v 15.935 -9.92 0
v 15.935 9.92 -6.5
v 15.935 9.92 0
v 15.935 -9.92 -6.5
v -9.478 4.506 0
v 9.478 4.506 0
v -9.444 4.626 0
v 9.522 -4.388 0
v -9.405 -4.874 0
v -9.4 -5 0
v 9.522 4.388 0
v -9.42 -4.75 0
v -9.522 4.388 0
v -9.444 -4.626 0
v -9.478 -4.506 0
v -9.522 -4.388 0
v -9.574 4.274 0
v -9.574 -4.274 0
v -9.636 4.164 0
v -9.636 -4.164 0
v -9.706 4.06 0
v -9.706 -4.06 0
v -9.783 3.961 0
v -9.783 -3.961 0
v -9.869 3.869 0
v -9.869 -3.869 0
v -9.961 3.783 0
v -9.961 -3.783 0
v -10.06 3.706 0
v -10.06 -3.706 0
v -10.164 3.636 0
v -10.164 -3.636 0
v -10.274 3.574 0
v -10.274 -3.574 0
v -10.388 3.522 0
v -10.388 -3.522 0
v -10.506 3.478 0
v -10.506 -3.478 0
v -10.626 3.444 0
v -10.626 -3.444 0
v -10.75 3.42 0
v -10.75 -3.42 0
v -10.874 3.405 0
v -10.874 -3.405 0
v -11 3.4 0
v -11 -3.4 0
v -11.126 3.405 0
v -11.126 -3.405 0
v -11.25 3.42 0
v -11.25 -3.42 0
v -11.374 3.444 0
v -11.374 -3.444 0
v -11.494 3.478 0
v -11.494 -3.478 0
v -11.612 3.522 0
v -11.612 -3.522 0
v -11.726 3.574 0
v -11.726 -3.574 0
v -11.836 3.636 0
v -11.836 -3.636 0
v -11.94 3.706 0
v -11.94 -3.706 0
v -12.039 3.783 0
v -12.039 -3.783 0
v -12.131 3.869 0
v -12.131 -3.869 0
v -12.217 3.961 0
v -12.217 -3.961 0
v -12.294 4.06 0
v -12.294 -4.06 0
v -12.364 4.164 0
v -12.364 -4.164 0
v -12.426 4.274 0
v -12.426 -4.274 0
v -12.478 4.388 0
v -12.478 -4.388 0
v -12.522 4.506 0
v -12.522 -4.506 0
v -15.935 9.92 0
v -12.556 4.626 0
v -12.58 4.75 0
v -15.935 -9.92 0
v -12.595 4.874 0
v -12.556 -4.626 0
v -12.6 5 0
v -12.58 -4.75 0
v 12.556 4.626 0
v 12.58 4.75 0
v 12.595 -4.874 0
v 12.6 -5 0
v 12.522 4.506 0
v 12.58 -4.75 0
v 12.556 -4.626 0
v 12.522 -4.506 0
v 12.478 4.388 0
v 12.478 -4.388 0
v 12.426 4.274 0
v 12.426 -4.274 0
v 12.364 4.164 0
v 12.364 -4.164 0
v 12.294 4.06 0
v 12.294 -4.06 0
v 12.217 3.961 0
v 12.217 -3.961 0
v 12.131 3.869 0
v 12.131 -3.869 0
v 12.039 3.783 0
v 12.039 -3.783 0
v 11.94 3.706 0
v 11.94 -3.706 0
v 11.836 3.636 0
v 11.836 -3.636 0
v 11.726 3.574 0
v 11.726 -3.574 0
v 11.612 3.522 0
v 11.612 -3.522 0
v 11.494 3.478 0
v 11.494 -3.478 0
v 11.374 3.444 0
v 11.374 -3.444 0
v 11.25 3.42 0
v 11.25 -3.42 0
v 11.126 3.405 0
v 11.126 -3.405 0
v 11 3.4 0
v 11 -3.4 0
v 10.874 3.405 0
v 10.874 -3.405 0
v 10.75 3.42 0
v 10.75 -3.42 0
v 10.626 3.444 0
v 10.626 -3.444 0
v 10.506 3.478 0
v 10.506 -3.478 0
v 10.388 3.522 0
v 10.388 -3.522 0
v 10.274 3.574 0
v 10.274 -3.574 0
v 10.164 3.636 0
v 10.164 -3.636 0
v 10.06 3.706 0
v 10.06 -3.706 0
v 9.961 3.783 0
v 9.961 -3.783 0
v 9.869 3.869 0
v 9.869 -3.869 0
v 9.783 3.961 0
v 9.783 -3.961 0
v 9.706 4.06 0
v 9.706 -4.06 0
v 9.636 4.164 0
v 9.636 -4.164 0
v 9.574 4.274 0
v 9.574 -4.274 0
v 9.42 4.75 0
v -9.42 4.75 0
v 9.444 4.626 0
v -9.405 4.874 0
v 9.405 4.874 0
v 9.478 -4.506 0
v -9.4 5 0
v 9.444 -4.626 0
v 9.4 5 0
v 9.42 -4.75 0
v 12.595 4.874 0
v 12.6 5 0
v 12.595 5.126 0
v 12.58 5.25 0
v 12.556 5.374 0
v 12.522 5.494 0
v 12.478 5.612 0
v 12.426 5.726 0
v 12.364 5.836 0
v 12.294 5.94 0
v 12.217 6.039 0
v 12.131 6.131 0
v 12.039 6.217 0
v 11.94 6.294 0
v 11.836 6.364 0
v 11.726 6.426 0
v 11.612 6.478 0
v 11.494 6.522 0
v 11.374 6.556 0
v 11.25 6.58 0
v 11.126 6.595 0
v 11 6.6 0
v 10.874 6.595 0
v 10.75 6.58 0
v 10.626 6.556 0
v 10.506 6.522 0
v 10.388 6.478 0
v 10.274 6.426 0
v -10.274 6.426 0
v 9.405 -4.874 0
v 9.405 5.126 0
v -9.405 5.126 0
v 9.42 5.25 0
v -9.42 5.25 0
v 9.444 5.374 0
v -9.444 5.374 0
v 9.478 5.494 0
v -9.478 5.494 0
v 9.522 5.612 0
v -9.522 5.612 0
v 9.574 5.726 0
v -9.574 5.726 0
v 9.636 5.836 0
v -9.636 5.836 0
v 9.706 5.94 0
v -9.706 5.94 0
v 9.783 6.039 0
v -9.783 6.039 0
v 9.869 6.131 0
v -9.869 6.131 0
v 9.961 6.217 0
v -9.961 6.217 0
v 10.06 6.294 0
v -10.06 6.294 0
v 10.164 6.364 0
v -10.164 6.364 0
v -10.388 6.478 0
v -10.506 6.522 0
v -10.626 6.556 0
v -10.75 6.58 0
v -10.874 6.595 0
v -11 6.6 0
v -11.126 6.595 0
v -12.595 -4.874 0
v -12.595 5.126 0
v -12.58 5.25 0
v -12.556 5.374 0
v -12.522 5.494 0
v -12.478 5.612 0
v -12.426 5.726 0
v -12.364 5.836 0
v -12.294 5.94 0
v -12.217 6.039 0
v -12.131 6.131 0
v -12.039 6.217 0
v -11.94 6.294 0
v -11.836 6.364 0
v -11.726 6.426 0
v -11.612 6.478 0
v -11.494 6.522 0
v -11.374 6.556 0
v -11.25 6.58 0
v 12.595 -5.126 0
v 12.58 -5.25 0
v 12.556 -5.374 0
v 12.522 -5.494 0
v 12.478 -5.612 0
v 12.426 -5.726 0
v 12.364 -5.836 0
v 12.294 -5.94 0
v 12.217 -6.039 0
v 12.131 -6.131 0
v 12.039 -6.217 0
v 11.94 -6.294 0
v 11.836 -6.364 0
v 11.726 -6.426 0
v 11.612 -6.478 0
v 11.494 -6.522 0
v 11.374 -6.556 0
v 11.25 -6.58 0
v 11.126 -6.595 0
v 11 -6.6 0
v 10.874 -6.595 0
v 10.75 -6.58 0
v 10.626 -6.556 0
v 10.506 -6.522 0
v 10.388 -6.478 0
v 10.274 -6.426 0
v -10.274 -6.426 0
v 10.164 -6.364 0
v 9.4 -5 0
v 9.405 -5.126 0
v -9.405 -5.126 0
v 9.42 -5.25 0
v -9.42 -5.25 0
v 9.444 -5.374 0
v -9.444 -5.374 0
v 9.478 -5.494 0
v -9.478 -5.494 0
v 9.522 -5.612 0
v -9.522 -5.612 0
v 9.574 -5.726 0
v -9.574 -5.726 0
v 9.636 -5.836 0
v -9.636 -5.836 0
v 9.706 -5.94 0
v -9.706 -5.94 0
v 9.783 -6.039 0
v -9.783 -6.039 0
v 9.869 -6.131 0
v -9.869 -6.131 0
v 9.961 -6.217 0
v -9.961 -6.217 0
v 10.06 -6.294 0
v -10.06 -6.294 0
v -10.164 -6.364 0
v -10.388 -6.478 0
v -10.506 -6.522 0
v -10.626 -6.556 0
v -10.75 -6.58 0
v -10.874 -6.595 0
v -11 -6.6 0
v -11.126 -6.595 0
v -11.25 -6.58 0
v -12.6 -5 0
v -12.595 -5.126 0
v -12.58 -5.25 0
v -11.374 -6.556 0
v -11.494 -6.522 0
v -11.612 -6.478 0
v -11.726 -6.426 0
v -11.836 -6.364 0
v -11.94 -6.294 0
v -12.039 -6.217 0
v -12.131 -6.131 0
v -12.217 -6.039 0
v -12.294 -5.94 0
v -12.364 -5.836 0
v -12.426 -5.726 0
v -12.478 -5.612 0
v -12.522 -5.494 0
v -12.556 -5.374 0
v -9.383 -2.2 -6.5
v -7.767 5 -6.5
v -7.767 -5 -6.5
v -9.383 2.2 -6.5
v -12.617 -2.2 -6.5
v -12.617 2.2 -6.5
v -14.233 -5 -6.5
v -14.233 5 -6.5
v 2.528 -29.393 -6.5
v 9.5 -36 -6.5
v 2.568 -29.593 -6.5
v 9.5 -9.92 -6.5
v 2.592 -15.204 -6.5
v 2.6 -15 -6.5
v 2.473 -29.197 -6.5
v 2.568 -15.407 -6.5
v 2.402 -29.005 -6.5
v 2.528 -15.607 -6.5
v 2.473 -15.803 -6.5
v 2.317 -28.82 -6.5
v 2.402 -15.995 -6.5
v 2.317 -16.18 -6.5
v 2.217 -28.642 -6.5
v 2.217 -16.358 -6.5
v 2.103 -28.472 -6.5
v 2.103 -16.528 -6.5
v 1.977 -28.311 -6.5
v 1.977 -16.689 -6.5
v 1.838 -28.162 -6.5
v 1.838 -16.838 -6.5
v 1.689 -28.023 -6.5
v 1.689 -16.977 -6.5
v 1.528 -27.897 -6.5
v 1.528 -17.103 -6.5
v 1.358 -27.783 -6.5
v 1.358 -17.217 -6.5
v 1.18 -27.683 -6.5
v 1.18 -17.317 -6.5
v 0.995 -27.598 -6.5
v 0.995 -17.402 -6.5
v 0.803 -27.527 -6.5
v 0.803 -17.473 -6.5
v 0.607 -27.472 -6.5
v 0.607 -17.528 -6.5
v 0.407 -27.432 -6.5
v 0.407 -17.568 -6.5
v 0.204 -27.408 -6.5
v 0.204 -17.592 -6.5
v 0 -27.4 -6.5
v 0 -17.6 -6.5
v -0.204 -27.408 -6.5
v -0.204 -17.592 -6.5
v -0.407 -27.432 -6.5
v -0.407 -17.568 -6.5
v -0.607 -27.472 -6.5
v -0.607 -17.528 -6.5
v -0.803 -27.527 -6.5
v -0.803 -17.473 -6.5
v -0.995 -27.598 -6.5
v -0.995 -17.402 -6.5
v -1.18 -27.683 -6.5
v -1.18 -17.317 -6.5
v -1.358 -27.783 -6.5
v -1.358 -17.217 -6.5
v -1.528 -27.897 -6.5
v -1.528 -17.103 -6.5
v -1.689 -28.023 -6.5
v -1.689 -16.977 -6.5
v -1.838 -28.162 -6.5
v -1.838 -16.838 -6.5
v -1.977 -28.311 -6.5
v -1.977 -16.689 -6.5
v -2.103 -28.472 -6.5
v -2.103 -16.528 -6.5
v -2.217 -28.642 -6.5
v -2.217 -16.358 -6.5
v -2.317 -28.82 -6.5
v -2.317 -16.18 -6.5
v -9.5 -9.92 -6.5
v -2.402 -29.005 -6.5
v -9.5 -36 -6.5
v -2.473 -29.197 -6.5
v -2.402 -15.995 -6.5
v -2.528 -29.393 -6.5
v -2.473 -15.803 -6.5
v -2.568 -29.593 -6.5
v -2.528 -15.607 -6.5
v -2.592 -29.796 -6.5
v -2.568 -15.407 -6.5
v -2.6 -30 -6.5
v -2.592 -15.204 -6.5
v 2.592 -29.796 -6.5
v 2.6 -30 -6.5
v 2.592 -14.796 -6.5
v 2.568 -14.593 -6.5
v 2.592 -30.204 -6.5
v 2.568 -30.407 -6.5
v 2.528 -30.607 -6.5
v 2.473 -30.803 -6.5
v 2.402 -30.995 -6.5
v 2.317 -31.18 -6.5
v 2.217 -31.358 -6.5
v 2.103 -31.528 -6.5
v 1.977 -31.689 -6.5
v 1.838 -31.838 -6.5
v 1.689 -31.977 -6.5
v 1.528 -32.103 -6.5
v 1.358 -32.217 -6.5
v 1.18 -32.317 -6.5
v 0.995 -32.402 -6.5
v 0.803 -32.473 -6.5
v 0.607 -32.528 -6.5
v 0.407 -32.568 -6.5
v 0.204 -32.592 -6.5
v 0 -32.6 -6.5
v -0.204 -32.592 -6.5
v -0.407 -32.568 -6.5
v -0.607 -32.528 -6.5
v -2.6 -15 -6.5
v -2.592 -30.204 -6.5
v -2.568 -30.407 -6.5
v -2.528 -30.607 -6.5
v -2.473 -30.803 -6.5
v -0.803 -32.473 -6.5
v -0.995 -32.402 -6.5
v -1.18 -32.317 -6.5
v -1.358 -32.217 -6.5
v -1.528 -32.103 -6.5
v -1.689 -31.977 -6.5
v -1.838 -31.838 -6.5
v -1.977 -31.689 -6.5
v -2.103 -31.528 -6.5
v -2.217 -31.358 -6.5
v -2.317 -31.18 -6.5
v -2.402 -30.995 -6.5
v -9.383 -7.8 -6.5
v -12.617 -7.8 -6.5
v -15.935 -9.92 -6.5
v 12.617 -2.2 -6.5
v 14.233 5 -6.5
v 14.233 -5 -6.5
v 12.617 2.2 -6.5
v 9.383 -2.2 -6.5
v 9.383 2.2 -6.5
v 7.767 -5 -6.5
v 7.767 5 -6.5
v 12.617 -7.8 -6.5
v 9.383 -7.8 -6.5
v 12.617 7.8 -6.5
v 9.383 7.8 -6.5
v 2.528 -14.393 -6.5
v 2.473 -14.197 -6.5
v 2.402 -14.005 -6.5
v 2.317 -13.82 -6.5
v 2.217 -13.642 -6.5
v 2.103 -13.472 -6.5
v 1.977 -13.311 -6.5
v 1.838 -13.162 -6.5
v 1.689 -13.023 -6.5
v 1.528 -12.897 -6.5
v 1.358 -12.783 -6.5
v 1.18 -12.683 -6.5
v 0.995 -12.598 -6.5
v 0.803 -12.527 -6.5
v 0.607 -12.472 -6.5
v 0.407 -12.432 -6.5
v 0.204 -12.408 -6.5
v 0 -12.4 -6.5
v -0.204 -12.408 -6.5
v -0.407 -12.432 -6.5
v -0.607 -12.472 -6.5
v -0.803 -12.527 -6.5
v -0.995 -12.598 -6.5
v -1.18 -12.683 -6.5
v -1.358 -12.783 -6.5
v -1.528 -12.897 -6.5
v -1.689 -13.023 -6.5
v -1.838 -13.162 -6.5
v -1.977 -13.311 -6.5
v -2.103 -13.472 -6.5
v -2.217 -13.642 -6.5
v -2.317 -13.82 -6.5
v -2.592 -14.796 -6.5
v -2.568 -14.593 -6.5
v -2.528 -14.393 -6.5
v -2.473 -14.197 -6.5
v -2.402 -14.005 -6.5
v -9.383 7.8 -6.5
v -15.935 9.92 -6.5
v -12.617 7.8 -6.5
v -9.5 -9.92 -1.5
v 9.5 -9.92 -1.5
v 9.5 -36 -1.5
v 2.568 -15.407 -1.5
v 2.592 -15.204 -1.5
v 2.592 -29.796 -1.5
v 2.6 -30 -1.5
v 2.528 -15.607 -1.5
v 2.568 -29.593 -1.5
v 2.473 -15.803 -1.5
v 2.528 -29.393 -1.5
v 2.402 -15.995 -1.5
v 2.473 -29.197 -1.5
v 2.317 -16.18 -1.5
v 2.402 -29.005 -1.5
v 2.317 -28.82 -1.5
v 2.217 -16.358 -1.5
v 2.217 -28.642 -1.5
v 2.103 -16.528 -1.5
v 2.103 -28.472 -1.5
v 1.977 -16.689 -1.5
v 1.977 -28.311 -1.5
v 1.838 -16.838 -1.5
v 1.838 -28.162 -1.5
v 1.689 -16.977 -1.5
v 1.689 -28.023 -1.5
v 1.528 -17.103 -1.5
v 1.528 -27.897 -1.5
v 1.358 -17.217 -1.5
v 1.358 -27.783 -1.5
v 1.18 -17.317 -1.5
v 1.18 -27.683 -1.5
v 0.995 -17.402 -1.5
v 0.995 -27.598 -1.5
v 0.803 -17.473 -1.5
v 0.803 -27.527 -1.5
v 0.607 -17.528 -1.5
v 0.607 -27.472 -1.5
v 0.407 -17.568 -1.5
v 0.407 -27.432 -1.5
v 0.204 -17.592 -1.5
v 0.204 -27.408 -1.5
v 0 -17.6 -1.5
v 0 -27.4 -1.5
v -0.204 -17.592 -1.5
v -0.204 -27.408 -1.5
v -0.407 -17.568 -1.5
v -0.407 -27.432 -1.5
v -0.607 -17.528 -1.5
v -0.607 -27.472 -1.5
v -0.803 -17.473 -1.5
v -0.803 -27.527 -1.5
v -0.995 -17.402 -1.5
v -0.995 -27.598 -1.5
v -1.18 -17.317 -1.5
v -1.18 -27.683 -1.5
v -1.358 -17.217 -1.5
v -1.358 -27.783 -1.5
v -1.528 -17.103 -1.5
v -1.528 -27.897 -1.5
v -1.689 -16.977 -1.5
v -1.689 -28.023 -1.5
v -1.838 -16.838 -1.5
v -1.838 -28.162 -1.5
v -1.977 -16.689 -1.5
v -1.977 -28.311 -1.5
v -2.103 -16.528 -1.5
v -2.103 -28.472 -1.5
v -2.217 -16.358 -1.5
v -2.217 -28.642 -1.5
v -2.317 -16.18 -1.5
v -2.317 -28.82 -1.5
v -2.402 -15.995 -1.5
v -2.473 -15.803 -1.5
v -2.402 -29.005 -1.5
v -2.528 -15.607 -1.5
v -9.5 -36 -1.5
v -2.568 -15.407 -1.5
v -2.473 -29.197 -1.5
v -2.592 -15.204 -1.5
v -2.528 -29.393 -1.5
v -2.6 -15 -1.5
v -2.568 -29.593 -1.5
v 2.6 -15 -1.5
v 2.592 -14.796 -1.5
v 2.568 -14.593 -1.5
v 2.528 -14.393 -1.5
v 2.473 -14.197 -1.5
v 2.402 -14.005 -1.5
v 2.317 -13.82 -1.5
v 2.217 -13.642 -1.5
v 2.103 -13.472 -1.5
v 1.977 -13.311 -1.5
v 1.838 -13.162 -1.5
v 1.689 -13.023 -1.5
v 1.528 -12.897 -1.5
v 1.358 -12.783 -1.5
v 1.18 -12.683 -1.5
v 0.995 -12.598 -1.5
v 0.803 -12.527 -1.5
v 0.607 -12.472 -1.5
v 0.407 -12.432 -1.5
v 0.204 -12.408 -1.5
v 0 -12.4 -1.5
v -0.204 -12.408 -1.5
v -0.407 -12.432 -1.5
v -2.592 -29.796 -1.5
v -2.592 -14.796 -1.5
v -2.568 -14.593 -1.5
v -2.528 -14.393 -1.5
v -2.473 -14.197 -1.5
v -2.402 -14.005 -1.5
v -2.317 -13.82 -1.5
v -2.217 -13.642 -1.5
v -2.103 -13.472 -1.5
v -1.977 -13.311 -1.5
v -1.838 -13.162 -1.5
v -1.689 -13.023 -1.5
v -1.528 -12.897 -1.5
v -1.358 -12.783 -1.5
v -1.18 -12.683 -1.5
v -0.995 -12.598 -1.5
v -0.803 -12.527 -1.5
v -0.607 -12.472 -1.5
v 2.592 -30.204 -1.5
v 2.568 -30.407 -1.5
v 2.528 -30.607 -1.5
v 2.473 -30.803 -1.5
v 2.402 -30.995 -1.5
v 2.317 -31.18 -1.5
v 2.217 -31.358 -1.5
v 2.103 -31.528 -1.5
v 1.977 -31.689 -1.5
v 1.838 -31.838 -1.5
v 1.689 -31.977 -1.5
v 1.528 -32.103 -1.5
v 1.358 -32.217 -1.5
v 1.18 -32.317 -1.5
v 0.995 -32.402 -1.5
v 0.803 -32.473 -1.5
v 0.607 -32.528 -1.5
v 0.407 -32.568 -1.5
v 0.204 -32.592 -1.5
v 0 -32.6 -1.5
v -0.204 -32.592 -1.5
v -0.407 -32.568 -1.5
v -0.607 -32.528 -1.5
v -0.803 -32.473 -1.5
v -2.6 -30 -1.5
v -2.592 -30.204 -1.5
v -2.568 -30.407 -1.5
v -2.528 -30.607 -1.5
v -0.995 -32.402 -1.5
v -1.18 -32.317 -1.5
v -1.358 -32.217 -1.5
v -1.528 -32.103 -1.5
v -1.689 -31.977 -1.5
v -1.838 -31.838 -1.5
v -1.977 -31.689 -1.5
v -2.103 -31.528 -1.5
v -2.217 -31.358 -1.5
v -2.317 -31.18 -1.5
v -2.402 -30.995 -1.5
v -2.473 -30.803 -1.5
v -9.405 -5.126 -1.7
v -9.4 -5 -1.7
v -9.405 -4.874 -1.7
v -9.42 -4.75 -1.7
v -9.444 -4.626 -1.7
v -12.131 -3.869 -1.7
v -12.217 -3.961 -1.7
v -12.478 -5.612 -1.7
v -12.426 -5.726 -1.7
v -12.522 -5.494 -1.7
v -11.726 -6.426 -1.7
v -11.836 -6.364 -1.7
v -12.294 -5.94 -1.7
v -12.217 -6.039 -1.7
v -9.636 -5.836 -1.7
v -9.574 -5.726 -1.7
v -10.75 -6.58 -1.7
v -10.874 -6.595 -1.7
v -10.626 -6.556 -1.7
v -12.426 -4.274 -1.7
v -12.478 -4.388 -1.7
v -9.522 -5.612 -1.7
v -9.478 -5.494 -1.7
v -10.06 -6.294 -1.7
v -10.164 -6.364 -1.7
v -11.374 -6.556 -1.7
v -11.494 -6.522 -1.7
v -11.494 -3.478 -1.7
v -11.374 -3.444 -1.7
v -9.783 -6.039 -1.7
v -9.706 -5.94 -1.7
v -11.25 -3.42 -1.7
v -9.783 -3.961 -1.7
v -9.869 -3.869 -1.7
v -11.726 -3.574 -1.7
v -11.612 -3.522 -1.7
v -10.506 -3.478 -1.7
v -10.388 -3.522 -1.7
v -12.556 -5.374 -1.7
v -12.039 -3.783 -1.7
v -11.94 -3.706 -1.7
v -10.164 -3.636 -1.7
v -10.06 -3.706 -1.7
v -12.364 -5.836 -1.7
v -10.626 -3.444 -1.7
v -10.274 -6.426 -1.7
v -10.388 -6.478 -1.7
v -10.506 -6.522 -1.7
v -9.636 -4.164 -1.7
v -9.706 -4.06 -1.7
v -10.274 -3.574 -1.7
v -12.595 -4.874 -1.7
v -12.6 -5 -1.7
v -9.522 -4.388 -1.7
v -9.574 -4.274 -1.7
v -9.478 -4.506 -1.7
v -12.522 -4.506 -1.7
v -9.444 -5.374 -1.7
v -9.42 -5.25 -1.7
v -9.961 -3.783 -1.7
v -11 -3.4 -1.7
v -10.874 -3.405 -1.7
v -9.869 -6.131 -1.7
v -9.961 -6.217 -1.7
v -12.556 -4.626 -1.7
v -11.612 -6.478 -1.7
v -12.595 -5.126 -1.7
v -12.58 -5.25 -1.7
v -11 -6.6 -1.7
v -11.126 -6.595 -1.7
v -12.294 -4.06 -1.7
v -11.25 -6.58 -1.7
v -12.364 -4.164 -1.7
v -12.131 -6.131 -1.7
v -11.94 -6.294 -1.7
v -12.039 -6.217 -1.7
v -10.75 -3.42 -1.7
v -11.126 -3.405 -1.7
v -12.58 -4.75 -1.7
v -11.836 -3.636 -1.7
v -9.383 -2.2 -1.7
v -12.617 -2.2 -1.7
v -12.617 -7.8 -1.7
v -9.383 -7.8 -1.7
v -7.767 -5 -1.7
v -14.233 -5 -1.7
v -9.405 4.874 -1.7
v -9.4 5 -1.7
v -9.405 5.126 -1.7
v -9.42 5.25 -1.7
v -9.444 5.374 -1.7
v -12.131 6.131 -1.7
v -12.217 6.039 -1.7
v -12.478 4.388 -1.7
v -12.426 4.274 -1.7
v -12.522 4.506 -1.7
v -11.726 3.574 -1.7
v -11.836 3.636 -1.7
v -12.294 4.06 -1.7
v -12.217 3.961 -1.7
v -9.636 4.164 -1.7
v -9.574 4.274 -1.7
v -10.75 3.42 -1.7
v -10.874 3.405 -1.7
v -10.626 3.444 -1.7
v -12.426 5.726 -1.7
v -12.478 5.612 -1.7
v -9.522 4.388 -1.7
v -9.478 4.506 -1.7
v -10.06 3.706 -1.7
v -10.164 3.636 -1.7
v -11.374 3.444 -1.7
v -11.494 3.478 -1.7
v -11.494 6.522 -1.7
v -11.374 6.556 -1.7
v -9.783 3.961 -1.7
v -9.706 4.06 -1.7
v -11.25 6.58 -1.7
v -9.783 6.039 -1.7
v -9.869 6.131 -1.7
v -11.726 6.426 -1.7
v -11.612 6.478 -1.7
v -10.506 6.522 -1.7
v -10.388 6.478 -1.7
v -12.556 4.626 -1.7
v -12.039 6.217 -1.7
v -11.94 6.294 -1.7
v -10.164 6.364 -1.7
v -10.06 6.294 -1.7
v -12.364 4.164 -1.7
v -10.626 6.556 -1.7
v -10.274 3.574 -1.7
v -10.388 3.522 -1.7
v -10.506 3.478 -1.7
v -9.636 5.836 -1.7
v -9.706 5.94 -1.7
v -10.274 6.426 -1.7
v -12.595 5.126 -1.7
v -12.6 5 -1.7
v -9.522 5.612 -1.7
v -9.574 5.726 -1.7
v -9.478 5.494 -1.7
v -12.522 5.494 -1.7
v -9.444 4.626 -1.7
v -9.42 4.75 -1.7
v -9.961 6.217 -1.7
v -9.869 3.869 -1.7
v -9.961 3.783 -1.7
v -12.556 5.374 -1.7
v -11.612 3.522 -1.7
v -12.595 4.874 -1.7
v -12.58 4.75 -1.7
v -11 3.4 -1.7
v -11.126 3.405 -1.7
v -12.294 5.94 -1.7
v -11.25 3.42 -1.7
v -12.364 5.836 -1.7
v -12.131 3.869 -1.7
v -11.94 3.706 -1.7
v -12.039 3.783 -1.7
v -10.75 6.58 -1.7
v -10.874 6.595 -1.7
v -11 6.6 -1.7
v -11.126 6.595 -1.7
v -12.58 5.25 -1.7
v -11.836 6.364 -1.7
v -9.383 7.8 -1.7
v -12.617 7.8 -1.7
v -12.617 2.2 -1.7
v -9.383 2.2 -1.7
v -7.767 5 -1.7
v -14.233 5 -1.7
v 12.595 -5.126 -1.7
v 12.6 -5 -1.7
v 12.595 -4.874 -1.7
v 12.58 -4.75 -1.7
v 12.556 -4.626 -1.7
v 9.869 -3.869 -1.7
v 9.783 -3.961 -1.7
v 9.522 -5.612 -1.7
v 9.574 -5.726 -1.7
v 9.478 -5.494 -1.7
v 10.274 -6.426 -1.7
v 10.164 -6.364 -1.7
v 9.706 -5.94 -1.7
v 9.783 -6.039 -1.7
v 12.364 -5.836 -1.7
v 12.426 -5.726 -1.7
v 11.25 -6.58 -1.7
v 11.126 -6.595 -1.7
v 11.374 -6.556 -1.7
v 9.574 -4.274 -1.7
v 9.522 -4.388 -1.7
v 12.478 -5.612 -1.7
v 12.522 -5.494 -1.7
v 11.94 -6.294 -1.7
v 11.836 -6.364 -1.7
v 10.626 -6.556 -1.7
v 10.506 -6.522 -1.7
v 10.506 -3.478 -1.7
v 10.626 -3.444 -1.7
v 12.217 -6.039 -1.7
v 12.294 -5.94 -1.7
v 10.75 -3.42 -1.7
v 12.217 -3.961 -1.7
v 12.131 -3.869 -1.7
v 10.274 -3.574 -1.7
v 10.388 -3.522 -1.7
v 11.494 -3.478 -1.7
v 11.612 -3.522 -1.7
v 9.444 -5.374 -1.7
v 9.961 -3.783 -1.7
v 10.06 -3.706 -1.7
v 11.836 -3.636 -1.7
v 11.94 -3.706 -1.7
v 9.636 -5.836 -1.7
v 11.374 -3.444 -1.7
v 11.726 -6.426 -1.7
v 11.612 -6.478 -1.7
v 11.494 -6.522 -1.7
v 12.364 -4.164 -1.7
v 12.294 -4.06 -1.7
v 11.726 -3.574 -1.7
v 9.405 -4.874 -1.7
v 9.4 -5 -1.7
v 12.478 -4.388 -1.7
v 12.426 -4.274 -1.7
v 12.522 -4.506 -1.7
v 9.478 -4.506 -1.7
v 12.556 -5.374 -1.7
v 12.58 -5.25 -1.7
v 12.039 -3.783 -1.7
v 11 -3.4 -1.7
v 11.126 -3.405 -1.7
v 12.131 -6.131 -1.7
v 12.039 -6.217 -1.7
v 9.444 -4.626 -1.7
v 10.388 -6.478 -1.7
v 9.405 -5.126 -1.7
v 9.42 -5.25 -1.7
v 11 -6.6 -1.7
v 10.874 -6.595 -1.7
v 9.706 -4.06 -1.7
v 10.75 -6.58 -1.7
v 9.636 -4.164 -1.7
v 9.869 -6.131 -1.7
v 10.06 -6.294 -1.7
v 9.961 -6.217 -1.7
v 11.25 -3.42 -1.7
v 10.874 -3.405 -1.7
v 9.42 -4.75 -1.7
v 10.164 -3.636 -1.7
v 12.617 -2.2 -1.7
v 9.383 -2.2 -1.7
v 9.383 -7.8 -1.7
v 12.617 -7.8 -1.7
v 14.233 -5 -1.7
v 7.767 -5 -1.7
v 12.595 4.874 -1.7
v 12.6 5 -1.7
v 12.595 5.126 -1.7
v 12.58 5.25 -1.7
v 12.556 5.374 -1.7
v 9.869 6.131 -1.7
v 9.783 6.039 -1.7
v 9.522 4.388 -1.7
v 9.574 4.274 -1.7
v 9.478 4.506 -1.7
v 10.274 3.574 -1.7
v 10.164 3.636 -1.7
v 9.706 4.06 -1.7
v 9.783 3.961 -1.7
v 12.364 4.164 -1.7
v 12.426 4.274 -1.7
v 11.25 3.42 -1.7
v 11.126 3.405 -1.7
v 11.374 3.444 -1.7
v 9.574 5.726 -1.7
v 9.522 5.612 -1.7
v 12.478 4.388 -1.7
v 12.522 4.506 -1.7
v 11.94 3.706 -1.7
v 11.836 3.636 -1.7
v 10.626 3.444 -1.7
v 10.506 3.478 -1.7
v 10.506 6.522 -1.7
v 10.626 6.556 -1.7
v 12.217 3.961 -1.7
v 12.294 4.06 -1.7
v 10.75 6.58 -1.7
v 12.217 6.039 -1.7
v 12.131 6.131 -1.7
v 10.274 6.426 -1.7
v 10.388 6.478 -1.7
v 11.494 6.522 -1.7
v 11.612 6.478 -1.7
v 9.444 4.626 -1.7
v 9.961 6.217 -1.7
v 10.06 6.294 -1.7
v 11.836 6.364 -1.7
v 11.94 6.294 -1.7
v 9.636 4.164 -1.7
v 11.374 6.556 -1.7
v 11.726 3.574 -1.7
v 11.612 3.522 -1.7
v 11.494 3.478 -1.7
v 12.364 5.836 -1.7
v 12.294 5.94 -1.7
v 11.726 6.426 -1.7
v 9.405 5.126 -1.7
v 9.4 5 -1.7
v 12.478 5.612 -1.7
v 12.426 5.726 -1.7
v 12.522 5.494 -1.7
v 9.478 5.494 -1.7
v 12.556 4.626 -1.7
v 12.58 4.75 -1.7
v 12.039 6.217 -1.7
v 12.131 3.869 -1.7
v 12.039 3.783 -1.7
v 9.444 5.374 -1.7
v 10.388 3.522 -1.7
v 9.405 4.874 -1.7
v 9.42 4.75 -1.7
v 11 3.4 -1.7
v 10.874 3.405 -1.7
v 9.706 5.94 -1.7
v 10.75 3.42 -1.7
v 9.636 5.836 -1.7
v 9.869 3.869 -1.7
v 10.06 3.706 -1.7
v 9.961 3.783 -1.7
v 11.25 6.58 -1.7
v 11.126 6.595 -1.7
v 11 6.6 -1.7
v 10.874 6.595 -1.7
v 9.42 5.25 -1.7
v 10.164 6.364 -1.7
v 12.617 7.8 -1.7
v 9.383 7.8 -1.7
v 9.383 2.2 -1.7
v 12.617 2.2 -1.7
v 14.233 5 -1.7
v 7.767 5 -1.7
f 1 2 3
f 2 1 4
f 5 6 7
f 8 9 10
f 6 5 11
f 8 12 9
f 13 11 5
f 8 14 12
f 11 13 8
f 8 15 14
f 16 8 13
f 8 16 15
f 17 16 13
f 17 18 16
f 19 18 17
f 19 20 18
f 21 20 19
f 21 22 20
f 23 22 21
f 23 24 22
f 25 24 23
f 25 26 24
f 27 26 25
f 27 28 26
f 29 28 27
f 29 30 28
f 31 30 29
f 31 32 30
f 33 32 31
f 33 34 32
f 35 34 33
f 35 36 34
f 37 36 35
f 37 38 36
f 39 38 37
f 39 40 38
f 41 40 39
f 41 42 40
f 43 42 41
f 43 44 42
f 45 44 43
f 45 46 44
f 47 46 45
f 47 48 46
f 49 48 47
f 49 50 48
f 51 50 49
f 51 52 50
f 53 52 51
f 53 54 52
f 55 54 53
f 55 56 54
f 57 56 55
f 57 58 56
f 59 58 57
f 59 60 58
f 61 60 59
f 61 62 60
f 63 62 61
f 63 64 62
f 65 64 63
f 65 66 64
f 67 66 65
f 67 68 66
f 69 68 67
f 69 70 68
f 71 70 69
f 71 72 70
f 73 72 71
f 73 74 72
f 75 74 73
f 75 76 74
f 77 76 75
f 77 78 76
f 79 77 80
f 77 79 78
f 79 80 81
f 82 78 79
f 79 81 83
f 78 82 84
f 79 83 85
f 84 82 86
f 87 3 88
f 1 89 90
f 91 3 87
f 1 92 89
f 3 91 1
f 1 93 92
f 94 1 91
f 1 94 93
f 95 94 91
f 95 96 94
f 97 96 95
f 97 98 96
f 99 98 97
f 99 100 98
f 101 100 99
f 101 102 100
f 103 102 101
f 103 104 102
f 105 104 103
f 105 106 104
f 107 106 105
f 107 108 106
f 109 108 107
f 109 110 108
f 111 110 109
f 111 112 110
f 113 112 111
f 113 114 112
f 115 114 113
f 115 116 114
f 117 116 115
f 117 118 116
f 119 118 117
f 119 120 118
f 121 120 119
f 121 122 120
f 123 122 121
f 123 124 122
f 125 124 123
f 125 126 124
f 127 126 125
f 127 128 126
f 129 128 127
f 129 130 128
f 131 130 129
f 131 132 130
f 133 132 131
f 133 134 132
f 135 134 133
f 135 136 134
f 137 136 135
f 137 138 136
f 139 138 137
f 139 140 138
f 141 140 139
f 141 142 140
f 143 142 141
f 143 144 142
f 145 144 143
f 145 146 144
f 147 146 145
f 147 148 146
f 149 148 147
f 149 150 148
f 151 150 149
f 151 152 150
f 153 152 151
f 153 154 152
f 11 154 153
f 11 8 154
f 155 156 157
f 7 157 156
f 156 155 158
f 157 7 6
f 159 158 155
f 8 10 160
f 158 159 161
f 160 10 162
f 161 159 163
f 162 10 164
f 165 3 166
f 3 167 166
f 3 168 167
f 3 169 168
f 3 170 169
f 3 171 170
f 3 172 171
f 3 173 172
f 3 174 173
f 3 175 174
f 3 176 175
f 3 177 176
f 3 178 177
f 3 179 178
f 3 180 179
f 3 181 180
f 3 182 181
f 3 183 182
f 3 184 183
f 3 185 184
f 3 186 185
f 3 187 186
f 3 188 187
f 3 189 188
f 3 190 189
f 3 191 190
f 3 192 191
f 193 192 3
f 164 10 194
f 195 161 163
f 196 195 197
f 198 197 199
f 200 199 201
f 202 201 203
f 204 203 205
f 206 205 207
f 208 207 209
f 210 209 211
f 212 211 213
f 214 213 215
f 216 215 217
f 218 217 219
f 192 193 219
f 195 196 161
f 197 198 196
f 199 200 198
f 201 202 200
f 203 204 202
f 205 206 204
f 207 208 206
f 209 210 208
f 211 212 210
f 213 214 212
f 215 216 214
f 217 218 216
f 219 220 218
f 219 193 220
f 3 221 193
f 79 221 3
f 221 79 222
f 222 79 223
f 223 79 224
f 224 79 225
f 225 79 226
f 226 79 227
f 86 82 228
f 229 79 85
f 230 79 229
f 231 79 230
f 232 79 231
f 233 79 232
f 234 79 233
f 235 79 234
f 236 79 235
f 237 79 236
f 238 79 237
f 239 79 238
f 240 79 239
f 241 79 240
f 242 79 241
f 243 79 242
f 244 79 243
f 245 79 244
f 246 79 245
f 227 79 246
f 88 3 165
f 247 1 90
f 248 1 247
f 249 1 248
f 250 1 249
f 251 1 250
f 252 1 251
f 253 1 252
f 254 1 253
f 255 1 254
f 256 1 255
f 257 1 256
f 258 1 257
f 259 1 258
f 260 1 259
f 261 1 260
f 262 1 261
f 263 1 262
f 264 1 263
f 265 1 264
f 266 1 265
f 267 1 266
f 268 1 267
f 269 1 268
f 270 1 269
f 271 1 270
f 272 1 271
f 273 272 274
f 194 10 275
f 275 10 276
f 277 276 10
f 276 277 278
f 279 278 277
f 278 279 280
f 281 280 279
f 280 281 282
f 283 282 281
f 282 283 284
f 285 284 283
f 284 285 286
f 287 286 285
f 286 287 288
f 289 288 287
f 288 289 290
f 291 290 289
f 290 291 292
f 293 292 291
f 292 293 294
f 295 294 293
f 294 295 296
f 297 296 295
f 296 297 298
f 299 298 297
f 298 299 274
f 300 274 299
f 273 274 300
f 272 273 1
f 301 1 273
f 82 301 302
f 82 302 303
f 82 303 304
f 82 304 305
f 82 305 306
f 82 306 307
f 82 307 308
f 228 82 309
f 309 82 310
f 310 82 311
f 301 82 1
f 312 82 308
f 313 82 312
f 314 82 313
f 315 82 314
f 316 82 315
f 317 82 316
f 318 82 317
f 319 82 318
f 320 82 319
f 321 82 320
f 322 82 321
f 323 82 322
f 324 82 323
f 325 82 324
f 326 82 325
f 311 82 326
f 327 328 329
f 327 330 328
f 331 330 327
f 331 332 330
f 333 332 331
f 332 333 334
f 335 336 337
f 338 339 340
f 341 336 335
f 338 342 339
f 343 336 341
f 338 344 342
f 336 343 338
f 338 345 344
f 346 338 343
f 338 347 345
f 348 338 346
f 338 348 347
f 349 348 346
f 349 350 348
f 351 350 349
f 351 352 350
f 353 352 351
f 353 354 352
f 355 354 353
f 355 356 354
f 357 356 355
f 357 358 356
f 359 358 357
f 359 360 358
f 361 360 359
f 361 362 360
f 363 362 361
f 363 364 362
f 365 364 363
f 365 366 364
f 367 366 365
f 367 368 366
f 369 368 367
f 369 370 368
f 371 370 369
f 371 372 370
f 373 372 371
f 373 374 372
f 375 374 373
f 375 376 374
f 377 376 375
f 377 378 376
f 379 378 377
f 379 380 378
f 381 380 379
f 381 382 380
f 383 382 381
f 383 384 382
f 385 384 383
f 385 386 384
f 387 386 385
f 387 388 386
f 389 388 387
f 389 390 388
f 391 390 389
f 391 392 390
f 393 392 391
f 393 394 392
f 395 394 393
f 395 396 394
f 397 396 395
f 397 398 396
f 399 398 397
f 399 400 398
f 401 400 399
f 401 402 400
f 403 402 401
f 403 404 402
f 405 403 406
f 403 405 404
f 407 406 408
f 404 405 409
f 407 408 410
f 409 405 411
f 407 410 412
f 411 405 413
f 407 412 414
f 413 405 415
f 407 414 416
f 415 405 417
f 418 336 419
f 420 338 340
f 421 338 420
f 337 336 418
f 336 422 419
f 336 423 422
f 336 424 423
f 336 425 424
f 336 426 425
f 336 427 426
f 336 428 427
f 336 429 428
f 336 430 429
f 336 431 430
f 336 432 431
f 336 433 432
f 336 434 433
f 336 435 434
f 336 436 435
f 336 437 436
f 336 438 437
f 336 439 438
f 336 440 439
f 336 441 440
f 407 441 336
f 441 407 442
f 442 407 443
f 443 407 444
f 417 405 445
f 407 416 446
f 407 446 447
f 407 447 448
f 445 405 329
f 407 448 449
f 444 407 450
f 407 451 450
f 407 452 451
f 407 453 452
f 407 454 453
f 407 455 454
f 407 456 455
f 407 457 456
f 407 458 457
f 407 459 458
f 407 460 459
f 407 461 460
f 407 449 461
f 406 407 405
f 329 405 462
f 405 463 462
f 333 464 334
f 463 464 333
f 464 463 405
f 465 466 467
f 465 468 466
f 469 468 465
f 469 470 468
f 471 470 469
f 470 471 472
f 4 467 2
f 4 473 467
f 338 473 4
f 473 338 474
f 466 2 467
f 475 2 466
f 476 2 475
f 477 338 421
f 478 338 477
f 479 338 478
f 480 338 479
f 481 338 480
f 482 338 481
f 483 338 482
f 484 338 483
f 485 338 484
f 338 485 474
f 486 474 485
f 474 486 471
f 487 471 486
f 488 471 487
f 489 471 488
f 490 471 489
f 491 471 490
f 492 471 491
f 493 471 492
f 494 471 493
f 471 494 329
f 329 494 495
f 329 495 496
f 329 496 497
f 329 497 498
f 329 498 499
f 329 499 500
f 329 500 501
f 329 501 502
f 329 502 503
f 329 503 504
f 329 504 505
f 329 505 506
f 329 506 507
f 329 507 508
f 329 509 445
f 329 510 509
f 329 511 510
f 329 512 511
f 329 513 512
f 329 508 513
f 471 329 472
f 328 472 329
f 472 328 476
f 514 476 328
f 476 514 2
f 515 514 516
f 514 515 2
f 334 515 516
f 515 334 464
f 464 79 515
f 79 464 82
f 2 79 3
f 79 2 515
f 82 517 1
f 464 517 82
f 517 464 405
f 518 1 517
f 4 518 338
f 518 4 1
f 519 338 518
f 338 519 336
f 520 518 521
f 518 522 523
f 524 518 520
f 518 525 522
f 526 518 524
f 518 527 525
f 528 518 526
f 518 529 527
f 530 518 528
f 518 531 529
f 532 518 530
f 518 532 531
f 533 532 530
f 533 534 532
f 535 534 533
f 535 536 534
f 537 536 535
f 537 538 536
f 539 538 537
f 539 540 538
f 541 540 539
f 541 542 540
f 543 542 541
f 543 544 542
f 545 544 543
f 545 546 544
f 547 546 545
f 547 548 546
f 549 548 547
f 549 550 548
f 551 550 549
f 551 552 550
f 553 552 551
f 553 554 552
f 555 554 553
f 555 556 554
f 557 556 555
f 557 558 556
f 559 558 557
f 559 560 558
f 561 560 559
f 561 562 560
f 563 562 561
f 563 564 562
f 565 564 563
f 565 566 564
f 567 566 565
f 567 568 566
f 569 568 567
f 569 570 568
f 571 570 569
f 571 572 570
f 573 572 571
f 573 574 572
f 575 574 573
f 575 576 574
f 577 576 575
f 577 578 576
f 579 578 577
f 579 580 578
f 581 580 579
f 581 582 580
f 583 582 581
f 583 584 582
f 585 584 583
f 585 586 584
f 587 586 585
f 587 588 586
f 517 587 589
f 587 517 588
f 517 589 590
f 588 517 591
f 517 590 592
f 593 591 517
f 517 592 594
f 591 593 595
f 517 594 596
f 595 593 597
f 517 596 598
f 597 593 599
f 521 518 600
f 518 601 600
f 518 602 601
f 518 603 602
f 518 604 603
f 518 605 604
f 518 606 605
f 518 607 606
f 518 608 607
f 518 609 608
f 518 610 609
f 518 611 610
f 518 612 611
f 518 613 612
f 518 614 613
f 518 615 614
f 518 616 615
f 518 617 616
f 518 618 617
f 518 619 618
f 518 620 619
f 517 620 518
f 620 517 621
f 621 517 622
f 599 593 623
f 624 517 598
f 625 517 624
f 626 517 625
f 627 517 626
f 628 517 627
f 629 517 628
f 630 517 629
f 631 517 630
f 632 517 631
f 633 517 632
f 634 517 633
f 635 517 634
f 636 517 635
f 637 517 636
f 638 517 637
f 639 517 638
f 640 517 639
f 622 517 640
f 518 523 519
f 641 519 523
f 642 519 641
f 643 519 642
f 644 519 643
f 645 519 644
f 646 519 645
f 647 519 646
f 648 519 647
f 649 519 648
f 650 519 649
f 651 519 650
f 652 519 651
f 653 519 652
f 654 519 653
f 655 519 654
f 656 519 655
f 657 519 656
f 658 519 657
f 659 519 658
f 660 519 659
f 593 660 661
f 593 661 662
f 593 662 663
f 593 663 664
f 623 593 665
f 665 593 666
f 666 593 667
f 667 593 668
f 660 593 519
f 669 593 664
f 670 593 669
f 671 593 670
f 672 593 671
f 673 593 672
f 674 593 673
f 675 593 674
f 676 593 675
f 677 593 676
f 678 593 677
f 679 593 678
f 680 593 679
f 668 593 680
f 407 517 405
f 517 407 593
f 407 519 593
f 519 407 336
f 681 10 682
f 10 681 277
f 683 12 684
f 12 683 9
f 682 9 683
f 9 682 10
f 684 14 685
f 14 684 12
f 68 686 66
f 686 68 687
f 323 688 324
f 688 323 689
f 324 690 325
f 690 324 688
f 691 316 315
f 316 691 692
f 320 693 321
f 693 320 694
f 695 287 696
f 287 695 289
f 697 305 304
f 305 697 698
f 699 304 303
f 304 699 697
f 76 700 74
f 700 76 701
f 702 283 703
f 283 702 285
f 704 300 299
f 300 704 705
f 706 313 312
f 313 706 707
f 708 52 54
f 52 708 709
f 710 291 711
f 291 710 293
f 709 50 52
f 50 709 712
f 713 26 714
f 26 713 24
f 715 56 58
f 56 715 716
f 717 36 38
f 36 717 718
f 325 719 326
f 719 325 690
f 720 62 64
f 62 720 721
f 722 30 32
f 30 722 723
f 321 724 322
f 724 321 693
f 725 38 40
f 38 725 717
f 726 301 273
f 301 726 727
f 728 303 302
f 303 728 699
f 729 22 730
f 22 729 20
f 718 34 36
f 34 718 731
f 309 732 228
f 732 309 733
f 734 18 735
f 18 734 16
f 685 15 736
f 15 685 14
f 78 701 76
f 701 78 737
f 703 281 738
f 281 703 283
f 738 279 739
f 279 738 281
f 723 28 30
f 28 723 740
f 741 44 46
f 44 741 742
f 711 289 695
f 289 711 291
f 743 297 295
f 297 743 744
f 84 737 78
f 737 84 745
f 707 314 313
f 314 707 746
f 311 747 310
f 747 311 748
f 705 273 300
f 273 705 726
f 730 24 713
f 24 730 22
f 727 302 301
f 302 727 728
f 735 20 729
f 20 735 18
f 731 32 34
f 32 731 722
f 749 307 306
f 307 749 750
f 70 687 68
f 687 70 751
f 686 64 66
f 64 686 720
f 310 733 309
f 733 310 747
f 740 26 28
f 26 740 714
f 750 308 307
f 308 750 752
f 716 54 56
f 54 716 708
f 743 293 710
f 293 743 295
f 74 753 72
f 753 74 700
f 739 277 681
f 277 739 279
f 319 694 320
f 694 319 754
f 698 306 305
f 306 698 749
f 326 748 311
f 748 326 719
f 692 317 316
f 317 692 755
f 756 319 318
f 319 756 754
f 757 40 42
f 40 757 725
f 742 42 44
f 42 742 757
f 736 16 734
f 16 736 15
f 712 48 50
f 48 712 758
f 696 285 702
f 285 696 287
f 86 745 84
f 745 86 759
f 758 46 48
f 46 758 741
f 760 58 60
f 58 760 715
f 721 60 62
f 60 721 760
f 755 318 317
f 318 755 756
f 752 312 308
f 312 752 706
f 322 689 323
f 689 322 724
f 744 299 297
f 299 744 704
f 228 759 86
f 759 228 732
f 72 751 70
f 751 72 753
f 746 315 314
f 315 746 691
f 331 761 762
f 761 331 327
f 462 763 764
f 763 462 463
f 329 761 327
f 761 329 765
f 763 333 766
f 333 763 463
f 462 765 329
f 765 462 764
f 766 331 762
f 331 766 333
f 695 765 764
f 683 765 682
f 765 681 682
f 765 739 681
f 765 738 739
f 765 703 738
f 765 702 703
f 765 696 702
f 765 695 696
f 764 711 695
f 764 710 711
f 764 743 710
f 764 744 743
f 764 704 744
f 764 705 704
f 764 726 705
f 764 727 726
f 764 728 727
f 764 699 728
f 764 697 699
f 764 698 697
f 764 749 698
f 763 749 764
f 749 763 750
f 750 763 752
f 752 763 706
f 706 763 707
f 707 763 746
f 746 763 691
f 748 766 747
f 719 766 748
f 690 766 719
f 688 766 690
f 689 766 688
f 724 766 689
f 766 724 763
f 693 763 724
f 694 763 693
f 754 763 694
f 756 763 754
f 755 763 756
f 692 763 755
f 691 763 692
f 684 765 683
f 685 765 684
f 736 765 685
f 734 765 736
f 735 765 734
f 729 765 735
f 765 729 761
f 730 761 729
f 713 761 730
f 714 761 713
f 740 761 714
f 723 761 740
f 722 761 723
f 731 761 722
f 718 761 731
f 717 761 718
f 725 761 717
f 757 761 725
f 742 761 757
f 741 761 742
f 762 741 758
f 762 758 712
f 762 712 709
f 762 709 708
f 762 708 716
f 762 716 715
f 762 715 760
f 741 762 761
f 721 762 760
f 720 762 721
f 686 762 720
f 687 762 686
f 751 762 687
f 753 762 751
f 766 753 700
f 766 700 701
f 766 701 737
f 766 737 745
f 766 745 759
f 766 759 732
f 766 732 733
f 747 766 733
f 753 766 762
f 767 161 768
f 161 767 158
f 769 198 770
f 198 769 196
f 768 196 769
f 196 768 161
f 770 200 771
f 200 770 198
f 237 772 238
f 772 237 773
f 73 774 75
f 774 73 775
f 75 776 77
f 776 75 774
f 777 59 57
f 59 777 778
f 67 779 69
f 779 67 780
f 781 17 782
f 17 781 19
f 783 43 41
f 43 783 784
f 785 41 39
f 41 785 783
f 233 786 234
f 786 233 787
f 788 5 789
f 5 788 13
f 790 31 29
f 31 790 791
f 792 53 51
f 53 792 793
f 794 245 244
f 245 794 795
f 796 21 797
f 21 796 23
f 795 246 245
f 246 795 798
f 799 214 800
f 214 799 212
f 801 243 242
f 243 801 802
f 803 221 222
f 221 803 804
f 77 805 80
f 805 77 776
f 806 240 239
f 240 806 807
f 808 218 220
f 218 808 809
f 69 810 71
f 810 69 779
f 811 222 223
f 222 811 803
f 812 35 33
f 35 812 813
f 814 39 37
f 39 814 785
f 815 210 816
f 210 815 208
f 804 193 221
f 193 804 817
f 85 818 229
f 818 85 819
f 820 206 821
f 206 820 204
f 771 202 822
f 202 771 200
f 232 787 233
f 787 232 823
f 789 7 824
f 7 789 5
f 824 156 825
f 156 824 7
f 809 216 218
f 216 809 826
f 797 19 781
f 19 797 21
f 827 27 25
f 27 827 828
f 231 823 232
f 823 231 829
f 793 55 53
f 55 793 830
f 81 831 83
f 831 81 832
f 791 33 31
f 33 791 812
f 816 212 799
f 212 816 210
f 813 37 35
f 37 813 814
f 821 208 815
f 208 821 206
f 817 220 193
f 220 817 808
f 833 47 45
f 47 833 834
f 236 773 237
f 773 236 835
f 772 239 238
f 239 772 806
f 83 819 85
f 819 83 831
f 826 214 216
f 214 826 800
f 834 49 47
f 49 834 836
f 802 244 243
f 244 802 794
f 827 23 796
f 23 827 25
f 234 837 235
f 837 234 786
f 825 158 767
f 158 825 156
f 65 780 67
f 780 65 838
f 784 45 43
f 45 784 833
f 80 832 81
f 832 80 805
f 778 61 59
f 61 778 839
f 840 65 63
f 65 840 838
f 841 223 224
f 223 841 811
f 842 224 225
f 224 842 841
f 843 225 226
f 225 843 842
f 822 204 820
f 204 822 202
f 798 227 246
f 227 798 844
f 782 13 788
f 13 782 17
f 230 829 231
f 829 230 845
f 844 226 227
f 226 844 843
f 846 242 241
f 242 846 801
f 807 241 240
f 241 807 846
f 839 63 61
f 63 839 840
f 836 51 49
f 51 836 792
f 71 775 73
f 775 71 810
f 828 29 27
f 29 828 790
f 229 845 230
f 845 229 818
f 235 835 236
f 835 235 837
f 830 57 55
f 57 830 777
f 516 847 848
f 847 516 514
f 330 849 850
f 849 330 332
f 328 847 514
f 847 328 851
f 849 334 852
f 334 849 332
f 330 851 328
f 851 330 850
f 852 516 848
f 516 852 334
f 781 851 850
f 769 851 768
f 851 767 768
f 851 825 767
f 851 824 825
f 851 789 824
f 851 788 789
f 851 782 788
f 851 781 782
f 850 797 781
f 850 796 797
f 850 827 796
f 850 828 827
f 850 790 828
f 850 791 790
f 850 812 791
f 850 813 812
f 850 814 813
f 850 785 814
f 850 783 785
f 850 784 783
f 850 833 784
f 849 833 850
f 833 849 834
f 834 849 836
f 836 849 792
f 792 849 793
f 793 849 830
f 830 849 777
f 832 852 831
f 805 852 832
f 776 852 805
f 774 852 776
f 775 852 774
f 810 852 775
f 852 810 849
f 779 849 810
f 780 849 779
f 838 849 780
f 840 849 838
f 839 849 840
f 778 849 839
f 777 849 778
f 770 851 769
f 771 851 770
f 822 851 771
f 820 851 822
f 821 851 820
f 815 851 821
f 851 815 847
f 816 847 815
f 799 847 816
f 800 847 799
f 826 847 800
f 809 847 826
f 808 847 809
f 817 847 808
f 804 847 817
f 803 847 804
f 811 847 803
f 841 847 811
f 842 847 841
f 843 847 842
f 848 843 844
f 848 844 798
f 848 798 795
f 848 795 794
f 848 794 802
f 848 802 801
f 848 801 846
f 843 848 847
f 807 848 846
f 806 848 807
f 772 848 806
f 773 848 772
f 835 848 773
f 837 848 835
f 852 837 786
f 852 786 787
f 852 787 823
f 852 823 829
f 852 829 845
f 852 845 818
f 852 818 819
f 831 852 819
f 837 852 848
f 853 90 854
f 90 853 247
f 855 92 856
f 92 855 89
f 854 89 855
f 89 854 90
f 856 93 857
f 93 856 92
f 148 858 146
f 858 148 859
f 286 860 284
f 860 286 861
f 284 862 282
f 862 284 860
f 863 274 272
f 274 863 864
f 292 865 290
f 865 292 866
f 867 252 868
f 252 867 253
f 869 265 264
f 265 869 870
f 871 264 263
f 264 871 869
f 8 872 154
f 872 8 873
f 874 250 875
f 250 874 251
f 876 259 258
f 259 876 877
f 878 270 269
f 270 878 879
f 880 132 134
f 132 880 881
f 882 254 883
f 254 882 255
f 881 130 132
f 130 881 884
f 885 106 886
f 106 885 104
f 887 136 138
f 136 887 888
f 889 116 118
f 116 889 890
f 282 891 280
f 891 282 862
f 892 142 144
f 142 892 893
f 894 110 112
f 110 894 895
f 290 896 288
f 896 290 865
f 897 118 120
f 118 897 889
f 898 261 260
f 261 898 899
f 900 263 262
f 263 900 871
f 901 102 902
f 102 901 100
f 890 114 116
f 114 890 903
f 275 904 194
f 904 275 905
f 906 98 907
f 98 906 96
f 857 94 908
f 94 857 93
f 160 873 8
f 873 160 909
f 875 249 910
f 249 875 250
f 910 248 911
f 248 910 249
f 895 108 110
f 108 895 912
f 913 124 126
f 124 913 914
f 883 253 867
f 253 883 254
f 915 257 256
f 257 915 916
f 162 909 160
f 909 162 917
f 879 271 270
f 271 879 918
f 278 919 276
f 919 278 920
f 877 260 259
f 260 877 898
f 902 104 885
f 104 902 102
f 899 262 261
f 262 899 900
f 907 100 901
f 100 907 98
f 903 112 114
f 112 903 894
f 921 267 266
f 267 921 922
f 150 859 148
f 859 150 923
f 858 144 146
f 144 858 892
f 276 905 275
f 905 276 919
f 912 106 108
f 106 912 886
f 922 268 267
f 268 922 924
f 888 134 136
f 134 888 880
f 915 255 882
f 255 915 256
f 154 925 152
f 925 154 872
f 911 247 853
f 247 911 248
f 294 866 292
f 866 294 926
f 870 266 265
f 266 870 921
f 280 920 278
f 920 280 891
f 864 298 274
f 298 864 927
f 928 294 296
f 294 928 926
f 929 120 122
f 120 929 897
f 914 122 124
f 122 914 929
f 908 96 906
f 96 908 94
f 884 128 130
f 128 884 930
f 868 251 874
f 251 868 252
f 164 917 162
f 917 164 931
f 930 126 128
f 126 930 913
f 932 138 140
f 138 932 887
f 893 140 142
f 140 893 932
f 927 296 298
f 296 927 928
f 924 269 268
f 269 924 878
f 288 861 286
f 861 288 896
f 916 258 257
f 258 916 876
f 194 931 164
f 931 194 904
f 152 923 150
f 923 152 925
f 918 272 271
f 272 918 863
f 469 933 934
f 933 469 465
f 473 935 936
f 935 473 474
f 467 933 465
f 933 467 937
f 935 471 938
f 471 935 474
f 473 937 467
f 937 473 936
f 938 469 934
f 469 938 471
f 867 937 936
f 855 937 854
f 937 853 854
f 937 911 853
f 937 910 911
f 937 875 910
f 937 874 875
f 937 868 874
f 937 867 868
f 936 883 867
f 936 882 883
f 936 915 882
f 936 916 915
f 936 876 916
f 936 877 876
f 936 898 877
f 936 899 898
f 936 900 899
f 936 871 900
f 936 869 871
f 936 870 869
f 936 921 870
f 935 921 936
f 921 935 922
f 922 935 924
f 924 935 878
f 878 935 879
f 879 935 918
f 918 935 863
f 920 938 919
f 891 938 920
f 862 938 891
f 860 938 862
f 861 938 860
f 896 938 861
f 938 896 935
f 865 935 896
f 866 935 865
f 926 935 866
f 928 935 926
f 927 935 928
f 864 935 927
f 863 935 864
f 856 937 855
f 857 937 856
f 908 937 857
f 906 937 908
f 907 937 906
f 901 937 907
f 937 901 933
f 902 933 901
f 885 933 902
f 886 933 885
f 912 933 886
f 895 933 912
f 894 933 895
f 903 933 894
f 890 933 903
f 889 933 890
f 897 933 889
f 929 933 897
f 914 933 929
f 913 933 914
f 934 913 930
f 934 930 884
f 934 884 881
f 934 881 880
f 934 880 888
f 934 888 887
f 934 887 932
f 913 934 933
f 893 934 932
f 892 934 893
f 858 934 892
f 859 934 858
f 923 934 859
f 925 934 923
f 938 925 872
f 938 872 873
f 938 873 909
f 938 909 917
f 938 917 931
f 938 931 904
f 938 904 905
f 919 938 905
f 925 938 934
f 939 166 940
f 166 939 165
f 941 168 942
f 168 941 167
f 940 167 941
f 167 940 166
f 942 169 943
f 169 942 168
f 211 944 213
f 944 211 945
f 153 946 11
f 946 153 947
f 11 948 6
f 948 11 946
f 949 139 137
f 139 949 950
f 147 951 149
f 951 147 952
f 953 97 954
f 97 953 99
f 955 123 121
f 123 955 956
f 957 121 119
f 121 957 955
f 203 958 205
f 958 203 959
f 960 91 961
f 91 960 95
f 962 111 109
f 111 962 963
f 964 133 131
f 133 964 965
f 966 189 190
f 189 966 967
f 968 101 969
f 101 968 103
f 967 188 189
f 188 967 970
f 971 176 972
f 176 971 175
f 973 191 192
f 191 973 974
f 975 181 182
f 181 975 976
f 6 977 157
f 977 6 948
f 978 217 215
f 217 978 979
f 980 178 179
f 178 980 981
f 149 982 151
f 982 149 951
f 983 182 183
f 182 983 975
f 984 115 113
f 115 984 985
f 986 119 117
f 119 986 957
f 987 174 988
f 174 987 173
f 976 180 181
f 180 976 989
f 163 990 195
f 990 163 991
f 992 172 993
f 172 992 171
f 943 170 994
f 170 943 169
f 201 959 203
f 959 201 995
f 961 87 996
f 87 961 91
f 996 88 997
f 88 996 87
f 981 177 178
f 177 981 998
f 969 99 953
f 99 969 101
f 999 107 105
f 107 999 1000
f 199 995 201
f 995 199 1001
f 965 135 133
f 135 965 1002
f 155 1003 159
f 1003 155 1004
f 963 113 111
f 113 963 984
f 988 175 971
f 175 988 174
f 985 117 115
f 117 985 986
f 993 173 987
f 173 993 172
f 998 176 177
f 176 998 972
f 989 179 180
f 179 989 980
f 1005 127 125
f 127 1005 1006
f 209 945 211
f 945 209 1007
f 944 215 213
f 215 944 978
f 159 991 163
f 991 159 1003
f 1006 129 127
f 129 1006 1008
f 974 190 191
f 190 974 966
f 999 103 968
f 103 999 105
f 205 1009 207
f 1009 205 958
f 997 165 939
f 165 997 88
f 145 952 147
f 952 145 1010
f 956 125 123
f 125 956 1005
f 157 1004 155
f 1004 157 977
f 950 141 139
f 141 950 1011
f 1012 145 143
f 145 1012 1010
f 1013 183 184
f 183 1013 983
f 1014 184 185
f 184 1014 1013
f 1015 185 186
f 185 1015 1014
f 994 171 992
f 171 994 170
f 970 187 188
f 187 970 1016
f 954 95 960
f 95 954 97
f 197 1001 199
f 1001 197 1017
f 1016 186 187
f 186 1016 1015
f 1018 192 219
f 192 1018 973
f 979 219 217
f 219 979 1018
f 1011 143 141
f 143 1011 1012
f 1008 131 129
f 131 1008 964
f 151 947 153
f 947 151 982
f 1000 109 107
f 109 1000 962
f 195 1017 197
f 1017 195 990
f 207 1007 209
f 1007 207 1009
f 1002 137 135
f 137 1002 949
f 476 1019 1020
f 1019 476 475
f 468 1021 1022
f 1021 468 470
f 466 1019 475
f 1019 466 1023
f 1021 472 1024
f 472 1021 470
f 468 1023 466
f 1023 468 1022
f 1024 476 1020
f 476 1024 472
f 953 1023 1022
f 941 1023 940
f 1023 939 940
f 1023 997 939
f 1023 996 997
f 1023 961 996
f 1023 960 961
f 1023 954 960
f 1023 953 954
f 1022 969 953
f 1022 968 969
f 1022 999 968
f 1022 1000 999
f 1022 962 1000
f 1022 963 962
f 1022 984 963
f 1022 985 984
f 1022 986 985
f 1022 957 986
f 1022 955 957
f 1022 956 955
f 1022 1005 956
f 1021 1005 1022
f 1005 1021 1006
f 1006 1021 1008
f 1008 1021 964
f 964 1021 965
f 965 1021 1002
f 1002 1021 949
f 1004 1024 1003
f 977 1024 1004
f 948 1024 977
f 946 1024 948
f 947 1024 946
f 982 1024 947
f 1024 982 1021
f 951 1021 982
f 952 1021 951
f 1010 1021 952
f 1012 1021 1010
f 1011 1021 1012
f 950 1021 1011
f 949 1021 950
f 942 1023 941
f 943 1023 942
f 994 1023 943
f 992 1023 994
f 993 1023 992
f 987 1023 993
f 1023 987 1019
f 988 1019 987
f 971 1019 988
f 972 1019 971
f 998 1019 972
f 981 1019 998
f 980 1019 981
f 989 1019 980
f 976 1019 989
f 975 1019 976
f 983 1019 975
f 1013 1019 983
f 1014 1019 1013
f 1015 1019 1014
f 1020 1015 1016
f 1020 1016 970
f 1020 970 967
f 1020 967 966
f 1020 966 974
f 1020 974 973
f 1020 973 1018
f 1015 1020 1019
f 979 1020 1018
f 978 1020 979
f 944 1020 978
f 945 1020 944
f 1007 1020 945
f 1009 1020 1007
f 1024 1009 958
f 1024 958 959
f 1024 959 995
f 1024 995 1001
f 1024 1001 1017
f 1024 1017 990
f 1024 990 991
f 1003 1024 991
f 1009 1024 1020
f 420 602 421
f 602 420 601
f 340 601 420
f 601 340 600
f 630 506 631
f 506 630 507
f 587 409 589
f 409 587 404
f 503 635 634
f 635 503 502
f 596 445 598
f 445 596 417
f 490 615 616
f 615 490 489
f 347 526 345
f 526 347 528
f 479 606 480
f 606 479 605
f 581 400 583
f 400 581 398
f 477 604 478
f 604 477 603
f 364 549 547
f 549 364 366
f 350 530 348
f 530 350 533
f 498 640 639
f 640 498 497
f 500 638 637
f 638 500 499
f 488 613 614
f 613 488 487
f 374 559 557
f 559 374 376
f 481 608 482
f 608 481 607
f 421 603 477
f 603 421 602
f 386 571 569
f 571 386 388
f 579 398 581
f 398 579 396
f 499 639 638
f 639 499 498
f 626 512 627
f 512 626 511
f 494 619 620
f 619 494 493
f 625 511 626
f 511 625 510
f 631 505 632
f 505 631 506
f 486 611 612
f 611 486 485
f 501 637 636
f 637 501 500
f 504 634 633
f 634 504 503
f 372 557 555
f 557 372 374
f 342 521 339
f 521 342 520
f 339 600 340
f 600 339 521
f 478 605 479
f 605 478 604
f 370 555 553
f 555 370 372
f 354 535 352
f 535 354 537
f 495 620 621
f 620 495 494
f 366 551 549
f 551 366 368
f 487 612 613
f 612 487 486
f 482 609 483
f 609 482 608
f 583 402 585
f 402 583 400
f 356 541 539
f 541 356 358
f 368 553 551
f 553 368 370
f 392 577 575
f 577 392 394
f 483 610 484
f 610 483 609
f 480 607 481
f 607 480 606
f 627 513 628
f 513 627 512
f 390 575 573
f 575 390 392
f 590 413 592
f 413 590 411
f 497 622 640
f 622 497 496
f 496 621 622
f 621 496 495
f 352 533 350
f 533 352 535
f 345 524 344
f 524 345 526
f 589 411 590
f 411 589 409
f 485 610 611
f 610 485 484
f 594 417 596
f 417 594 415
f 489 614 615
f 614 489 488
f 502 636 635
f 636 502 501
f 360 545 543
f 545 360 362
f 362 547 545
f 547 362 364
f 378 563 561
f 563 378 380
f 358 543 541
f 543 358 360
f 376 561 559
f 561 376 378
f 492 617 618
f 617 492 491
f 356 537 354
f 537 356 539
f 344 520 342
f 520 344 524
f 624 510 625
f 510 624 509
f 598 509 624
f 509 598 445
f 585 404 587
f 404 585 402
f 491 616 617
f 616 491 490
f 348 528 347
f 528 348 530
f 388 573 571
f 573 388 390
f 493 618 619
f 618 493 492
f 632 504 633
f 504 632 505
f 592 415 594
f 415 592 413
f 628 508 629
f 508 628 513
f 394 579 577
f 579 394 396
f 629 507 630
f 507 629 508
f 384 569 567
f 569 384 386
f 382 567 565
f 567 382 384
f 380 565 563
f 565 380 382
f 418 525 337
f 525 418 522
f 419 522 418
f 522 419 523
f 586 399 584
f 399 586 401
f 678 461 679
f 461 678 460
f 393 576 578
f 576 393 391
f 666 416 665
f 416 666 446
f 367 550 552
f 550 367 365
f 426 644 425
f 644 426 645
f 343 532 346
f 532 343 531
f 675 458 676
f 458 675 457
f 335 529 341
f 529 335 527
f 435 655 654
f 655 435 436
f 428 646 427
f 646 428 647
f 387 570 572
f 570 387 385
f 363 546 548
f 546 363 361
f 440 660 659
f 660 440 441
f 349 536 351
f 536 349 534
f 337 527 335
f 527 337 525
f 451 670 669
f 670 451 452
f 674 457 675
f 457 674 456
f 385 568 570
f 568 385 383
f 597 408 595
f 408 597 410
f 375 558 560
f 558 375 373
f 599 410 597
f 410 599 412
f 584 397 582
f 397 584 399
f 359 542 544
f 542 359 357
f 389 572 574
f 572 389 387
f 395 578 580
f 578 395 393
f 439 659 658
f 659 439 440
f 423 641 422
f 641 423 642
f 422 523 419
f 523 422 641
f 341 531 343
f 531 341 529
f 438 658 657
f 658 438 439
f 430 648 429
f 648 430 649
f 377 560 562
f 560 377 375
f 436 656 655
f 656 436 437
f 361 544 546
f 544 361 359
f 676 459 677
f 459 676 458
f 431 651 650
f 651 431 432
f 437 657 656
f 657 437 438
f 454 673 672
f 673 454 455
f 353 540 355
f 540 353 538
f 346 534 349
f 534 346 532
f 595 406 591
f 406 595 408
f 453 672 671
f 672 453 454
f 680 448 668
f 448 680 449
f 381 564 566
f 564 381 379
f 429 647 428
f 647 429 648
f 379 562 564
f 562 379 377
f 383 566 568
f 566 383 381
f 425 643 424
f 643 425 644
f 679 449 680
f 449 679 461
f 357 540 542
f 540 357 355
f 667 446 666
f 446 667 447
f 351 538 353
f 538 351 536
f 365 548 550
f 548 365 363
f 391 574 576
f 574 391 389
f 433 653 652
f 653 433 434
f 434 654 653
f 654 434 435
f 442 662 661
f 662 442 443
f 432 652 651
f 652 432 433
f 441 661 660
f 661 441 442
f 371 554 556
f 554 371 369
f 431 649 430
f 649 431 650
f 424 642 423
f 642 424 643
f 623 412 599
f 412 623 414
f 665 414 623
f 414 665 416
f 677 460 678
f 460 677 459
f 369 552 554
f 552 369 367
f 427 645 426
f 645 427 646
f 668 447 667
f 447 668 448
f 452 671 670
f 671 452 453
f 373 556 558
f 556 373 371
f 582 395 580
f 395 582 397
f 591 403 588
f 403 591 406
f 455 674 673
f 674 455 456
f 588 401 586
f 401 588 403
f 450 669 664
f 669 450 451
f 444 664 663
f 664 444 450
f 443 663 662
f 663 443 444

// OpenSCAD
switch_dim = [27.87, 15.84, 9.82];


module hex_nut() {
    f=5.6;
    t=2.6;
    intersection_for(a = [0, 60, 120])
    rotate([0,0,a])
    cube(size=[f*2,f,t],center=true);
}

module switch_holes() {
    $fn = 80;
    ds = [22.0,10.0];
    for (x = [-ds[0]/2,ds[0]/2]) {
	for (y = [-ds[1]/2,ds[1]/2]) {
	    translate([x,y,0]) {
		cylinder(r=1.6,h=20,center=true);
		hull() {
		    translate([0,0,-1]) hex_nut();
		    translate([0,0,-25]) hex_nut();
		}
	    }
	}
    }
}
module switch() {
    translate([0,0,switch_dim[2]/2])
    difference() {
	cube(size=switch_dim,center=true);
	switch_holes();
    }
}

module switch_mount() {
    $fn=80;
    pt=6.5;
    translate([0,0,-4])
    difference() {
	union() {
	    translate([0,0,pt/2 - 2.5])cube(size=[switch_dim[0]+4,switch_dim[1]+4,pt],center=true);
	    translate([0,-19,0]) cube(size=[19,34,5],center=true);
	}
	translate([0,0,2]) switch_holes();
	for (y = [-15,-30]) {
	    translate([0,y,0])
	    cylinder(r=2.6,h=20,center=true);
	}
    }
}

switch_mount();
//translate([0,0,0]) color([0.2,0.2,0.2]) switch();
